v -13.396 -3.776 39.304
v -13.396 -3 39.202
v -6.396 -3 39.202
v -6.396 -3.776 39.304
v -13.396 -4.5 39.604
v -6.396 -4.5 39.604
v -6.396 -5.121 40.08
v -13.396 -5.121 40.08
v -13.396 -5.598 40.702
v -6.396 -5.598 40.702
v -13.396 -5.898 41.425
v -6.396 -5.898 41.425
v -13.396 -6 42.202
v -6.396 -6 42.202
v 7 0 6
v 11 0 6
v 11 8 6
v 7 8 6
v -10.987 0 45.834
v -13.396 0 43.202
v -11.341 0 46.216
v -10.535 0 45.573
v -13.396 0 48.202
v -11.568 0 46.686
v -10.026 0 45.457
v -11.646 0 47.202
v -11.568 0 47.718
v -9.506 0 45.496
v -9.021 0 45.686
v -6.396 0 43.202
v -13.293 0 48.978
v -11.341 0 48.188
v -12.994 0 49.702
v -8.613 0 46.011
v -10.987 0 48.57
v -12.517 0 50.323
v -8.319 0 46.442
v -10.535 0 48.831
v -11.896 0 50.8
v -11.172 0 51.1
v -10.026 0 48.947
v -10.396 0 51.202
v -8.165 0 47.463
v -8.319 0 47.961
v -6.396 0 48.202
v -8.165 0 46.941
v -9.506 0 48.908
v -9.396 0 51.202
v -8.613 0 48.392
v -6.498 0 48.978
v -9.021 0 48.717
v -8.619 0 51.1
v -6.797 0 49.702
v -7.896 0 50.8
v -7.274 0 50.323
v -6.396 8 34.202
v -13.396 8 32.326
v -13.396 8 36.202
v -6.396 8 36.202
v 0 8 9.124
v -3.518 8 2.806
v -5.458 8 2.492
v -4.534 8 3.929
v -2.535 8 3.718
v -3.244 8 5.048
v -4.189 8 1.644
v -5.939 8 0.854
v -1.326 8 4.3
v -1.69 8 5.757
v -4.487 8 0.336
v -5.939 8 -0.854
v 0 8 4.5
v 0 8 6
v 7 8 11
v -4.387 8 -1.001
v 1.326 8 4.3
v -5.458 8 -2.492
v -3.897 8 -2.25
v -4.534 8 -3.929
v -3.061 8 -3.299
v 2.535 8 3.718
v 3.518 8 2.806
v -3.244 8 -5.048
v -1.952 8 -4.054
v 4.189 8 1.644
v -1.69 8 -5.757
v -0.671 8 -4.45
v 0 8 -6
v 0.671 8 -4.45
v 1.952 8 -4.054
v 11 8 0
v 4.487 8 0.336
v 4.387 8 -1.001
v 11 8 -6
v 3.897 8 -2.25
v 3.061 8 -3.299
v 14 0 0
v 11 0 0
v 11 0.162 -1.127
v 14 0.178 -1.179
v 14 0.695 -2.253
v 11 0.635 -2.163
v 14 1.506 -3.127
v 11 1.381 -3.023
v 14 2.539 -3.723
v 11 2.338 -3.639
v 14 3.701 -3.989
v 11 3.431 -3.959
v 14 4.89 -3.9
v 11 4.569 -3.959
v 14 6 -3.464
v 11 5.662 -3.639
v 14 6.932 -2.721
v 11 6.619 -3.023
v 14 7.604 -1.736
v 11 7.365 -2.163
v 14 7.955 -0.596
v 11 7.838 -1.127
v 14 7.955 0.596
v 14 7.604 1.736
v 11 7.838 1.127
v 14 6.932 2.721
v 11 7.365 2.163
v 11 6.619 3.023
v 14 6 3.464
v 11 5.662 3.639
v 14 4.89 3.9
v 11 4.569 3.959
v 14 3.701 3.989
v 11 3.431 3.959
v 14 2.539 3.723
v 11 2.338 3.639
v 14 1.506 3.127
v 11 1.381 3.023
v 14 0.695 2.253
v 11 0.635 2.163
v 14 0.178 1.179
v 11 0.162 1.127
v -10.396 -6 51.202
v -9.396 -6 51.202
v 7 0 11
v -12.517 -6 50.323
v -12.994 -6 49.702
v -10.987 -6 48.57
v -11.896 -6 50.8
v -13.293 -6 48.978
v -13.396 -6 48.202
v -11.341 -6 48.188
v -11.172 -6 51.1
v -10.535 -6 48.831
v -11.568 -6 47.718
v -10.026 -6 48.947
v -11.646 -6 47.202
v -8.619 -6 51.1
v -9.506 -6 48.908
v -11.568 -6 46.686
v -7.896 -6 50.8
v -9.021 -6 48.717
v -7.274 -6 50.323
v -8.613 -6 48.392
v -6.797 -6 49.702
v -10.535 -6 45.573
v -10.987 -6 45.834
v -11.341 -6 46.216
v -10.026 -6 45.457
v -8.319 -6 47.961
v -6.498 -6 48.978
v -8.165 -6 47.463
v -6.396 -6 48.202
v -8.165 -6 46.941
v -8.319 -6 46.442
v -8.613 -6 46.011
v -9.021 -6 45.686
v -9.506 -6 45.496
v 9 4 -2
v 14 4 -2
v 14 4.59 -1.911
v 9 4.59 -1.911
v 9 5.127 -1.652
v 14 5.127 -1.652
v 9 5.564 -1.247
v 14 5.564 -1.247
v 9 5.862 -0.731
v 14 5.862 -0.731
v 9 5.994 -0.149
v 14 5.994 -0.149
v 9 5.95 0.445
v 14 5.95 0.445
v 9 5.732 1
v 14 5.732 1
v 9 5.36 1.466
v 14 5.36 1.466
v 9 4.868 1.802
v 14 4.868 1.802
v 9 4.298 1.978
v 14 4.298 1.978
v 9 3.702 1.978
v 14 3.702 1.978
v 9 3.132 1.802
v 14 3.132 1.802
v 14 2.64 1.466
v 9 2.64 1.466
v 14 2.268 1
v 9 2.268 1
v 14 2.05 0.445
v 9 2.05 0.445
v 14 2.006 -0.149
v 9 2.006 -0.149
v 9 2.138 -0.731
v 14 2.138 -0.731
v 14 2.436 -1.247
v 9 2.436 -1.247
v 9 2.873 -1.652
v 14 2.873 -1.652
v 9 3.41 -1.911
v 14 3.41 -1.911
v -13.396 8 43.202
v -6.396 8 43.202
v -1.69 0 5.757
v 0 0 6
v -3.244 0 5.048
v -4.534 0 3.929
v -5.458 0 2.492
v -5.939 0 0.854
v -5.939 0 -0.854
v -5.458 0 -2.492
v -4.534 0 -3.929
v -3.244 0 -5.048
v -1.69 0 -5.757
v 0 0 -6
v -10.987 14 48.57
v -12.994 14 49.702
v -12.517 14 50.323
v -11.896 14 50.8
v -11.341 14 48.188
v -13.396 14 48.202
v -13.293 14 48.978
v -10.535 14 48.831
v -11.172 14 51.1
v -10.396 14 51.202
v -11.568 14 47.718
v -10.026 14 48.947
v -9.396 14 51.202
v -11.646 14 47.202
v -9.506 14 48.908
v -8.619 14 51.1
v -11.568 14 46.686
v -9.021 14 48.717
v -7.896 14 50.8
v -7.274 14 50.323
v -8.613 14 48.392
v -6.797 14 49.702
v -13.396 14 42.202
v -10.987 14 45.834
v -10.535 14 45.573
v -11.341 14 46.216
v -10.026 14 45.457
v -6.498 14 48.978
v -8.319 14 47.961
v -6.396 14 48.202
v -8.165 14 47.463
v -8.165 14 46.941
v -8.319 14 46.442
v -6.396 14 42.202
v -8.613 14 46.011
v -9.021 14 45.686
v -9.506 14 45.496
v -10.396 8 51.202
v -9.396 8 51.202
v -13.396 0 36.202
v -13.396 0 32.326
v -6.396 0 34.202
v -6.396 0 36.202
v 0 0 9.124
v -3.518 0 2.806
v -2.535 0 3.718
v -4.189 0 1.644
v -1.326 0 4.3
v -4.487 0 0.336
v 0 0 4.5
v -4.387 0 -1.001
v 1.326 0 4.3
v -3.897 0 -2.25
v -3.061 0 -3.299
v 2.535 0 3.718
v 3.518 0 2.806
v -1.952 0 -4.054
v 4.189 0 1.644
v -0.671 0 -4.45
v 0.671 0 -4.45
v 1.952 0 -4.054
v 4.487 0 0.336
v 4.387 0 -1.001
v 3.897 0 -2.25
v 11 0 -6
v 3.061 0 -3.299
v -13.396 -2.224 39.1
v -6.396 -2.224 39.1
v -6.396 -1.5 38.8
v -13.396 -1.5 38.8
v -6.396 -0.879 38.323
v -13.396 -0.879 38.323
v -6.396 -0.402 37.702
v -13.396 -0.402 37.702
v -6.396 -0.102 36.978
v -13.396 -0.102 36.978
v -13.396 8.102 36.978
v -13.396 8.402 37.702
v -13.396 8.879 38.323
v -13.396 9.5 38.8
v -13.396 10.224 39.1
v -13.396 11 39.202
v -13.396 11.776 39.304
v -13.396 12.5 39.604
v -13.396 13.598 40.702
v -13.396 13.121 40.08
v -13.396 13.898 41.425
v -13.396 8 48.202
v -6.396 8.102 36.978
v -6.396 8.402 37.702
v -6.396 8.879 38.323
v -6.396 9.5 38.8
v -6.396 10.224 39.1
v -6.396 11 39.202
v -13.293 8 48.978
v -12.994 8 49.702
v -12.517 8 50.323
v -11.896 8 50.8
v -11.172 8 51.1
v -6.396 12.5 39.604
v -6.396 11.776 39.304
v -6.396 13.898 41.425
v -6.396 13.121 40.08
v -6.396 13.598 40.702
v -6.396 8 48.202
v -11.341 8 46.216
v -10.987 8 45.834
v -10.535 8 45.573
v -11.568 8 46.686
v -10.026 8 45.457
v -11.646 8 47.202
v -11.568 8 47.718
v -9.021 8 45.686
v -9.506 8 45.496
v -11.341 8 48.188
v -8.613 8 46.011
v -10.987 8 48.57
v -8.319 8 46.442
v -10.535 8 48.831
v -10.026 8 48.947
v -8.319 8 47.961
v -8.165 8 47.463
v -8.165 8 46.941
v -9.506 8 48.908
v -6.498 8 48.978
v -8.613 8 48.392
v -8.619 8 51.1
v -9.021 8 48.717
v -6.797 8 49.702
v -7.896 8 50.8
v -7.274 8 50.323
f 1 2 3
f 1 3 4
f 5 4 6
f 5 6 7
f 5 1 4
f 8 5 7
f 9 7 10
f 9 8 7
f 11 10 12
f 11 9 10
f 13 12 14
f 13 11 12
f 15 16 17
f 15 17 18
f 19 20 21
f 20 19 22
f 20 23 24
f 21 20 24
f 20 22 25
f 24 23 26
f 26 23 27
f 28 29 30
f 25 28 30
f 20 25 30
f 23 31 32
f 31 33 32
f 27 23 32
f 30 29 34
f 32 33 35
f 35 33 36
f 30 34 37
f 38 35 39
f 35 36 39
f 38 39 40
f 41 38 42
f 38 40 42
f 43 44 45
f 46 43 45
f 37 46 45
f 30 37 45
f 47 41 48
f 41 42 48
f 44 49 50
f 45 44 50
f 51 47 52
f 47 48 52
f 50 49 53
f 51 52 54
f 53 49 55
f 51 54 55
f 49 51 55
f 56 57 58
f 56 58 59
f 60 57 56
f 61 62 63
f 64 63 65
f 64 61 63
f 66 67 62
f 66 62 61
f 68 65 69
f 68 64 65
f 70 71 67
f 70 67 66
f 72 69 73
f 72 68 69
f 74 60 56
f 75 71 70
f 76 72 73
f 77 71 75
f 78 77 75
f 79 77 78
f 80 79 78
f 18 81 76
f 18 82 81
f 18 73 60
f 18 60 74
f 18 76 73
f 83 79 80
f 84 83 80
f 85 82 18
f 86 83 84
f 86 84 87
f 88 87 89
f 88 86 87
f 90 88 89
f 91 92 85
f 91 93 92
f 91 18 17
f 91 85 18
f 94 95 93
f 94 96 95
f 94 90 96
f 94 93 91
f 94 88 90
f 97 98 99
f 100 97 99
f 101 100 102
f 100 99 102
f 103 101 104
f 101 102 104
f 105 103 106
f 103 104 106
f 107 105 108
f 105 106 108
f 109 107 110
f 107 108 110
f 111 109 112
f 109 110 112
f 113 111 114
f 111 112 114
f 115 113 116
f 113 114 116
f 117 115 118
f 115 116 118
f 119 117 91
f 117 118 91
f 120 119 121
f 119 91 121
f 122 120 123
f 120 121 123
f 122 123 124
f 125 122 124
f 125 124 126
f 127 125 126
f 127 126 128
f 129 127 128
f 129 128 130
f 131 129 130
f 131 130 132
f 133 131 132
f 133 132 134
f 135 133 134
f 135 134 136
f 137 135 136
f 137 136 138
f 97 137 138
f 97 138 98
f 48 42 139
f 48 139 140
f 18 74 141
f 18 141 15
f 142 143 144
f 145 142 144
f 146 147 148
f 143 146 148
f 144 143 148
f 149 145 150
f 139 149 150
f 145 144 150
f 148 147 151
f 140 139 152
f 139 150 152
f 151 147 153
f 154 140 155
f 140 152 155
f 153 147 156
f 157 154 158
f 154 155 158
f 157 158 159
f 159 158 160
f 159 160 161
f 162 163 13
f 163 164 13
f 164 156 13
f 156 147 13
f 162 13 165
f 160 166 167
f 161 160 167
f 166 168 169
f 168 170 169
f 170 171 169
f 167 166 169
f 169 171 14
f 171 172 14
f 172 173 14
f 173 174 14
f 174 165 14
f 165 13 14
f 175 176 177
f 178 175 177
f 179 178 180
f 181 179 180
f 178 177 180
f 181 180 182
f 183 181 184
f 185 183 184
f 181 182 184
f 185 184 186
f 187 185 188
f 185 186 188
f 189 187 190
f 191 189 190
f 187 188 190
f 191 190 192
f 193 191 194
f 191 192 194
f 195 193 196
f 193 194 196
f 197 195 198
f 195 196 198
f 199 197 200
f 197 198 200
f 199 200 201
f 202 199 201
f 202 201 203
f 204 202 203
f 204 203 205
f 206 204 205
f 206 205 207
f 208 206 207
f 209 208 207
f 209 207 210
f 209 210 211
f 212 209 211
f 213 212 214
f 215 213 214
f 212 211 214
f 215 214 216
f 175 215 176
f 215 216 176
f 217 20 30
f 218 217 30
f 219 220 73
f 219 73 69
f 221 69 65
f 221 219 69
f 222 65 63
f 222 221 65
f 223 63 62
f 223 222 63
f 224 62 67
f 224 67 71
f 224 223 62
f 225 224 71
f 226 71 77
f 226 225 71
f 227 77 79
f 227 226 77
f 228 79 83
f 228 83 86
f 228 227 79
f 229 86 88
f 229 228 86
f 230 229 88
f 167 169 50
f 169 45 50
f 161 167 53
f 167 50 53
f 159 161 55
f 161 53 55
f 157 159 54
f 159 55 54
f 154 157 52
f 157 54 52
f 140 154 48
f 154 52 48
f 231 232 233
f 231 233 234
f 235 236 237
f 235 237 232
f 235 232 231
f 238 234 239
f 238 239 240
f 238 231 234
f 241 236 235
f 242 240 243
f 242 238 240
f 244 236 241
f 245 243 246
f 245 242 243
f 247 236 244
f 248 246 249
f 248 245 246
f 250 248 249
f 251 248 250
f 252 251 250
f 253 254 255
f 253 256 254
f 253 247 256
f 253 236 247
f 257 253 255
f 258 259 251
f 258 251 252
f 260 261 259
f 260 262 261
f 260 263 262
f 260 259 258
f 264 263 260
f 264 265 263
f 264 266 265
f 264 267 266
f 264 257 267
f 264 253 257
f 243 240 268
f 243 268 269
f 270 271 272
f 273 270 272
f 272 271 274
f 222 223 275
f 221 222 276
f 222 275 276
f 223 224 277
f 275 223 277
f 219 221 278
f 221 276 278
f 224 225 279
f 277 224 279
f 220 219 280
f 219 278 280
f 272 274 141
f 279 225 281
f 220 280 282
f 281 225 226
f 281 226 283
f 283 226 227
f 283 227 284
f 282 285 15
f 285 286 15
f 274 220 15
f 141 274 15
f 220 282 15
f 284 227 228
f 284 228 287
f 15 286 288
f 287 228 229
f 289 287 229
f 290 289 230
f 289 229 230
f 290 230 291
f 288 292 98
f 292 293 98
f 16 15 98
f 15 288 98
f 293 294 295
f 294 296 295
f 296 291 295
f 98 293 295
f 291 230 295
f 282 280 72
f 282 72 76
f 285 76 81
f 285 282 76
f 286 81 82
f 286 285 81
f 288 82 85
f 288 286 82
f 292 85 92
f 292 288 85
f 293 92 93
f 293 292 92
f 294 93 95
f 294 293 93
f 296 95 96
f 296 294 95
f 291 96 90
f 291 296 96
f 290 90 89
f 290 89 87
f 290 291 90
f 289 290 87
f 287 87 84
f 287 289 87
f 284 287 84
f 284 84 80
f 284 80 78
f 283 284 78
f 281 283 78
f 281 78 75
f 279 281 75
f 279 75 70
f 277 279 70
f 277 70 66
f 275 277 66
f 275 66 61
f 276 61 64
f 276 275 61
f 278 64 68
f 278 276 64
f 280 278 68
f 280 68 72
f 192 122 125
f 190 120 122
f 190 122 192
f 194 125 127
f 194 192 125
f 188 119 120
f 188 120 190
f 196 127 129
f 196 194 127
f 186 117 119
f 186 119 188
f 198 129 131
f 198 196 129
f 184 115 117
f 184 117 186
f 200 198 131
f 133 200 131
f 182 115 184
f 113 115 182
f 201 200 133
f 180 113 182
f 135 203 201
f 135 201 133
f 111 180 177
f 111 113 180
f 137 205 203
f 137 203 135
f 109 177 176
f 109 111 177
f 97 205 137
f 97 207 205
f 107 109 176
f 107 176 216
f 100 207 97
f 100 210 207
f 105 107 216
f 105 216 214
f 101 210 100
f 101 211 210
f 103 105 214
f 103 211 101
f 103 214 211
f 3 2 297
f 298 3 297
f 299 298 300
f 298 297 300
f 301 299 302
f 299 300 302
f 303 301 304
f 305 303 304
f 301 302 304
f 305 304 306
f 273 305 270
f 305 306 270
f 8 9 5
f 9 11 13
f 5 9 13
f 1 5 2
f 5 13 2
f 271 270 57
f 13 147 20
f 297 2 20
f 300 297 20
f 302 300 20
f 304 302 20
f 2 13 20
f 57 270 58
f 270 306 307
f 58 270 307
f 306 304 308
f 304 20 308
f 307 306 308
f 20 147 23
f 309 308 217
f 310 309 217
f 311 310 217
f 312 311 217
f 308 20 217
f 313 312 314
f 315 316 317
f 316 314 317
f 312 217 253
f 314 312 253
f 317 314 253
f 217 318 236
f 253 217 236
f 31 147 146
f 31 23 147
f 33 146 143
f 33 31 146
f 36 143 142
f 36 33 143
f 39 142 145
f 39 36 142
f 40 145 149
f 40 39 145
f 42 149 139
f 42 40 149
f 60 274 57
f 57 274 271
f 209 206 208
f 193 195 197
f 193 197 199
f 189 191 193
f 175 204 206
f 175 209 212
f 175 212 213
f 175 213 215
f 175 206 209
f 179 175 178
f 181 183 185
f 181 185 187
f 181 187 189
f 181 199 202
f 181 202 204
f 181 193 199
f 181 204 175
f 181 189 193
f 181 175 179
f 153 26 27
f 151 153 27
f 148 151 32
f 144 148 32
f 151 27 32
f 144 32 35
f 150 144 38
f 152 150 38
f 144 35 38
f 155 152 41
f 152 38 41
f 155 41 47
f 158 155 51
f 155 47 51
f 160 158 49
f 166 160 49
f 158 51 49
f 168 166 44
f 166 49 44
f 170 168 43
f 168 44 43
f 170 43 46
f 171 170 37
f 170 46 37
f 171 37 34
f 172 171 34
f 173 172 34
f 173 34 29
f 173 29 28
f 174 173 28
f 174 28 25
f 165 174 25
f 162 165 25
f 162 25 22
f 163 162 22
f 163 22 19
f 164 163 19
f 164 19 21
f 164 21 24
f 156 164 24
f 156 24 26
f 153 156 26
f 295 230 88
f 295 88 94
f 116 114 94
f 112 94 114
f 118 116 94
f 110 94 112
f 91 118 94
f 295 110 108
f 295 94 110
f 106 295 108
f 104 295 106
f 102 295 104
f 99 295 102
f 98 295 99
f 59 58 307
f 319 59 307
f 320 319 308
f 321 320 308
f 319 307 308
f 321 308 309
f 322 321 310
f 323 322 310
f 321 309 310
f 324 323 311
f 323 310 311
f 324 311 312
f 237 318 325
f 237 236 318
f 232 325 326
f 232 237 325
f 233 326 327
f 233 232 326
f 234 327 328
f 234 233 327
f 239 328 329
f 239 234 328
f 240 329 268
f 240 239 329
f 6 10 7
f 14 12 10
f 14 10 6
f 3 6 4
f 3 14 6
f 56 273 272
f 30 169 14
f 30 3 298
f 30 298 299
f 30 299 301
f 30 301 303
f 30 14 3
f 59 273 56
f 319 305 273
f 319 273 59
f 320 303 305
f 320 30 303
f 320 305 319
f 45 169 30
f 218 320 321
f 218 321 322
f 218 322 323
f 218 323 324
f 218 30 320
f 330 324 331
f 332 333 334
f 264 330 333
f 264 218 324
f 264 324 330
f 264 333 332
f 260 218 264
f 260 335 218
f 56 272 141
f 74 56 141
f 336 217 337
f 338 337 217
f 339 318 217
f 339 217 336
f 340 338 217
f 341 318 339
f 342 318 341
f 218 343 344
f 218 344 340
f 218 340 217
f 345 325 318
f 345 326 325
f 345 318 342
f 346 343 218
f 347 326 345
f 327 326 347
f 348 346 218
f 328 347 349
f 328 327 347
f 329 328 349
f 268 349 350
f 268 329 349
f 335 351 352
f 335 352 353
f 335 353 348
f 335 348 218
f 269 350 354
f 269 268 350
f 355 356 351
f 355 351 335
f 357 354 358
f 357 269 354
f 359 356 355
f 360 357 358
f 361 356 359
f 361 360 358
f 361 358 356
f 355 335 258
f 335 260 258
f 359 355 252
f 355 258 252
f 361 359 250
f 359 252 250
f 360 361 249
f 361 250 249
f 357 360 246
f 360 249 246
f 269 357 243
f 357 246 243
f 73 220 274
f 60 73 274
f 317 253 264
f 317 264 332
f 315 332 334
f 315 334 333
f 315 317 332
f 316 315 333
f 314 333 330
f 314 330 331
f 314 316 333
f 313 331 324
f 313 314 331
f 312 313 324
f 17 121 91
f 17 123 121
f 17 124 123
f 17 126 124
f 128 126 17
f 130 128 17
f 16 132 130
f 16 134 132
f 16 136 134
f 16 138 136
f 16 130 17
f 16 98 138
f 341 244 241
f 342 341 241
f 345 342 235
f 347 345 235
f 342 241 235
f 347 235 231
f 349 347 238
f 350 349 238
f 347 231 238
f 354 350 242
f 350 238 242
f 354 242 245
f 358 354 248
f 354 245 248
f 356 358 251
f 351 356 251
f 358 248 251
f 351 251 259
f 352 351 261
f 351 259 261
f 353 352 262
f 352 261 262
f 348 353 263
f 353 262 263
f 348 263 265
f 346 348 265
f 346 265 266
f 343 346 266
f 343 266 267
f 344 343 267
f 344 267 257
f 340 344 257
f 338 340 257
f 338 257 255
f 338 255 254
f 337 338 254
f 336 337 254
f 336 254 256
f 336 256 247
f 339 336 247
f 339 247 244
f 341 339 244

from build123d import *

# Parameters (mm, degrees)
SKETCH1_R           = 4.5
BOSS_EXTRUDE1_DEPTH = 8
SKETCH2_R           = 4
BOSS_EXTRUDE2_DEPTH = 3
SKETCH3_R           = 2
CUT_EXTRUDE1_DEPTH  = 5
BOSS_EXTRUDE3_DEPTH = 8
SKETCH5_W           = 7
SKETCH5_H           = 20
BOSS_EXTRUDE4_DEPTH = 12
FILLET1_START       = -13.395559342
FILLET1_DEPTH       = 7
FILLET1_2_DEPTH     = 7
SKETCH6_W           = 7
SKETCH6_H           = 8
CUT_EXTRUDE2_DEPTH  = 8
FILLET2_R           = 3
SKETCH7_R           = 1.75
CUT_EXTRUDE3_DEPTH  = 57.724097483


with BuildPart() as part:
    # Sketch1 → Boss-Extrude1 (new body)
    with BuildSketch(Plane(origin=(0, 0, 0), x_dir=(1, 0, 0), z_dir=(0, 1, 0))):
        with BuildLine():
            Line((0, 6), (11, 6))
            Line((11, 6), (11, -6))
            Line((11, -6), (0, -6))
            ThreePointArc((0, -6), (-6, 0), (0, 6))
        make_face()
        with Locations(Location((0, 0, 0), (0, 0, 270))):
            Circle(SKETCH1_R, mode=Mode.SUBTRACT)
    extrude(amount=BOSS_EXTRUDE1_DEPTH)

    # Sketch2 → Boss-Extrude2 (add)
    with BuildSketch(Plane(origin=(11, 0, 0), x_dir=(0, 0, -1), z_dir=(1, 0, 0))):
        with Locations(Location((0, 4, 0), (0, 0, 270))):
            Circle(SKETCH2_R)
    extrude(amount=BOSS_EXTRUDE2_DEPTH)

    # Sketch3 → Cut-Extrude1 (cut)
    with BuildSketch(Plane(origin=(14, 0, 0), x_dir=(0, 0, -1), z_dir=(1, 0, 0))):
        with Locations((0, 4)):
            Circle(SKETCH3_R)
    extrude(amount=-CUT_EXTRUDE1_DEPTH, mode=Mode.SUBTRACT)

    # Sketch4 → Boss-Extrude3 (add)
    with BuildSketch(Plane(origin=(0, 0, 0), x_dir=(1, 0, 0), z_dir=(0, 1, 0))):
        Polygon((0, -6), (0, -9.124355653), (-13.395559342, -32.326145029), (-13.395559342, -39.201789376), (-6.395559342, -39.201789376), (-6.395559342, -34.201789376), (7, -11), (7, -6), align=None)
    extrude(amount=BOSS_EXTRUDE3_DEPTH)

    # Sketch5 → Boss-Extrude4 (add)
    with BuildSketch(Plane.XY.offset(39.201789376)):
        with Locations((-9.895559342, 4)):
            Rectangle(SKETCH5_W, SKETCH5_H)
    extrude(amount=BOSS_EXTRUDE4_DEPTH)

    # Fillet1: read off the stored shape, not the designer's step
    # Fillet1 outline → Fillet1 (cut)
    with BuildSketch(Plane.YZ.offset(FILLET1_START)):
        with BuildLine():
            Line((-6, 39.201789376), (-3, 39.201789376))
            ThreePointArc((-3, 39.201789376), (-5.121320344, 40.080469032), (-6, 42.201789376))
            Line((-6, 42.201789376), (-6, 39.201789376))
        make_face()
        with BuildLine():
            ThreePointArc((14, 42.201789376), (13.121320344, 40.080469032), (11, 39.201789376))
            Line((11, 39.201789376), (14, 39.201789376))
            Line((14, 39.201789376), (14, 42.201789376))
        make_face()
    extrude(amount=FILLET1_DEPTH, mode=Mode.SUBTRACT)

    # Fillet1 2 outline → Fillet1 2 (add)
    with BuildSketch(Plane.YZ.offset(FILLET1_START)):
        with BuildLine():
            ThreePointArc((-3, 39.201789376), (-0.878679657, 38.32310972), (0, 36.201789376))
            Line((0, 36.201789376), (0, 39.201789376))
            Line((0, 39.201789376), (-3, 39.201789376))
        make_face()
        with BuildLine():
            ThreePointArc((8, 36.201789376), (8.878679656, 38.32310972), (11, 39.201789376))
            Line((11, 39.201789376), (8, 39.201789376))
            Line((8, 39.201789376), (8, 36.201789376))
        make_face()
    extrude(amount=FILLET1_2_DEPTH)

    # Sketch6 → Cut-Extrude2 (cut)
    with BuildSketch(Plane.XY.offset(51.201789376)):
        with Locations((-9.895559342, 4)):
            Rectangle(SKETCH6_W, SKETCH6_H)
    extrude(amount=-CUT_EXTRUDE2_DEPTH, mode=Mode.SUBTRACT)

    # Fillet2
    fillet2_edges = [part.edges().sort_by_distance(p)[0] for p in [
        (-6.395559342, -3, 51.201789376),
        (-13.395559342, 11, 51.201789376),
        (-6.395559342, 11, 51.201789376),
        (-13.395559342, -3, 51.201789376),
    ]]
    fillet(fillet2_edges, radius=FILLET2_R)

    # Sketch7 → Cut-Extrude3 (cut, through all)
    with BuildSketch(Plane(origin=(0, 14, 0), x_dir=(1, 0, 0), z_dir=(0, 1, 0))):
        with Locations(Location((-9.895559342, -47.201789376, 0), (0, 0, 180))):
            Circle(SKETCH7_R)
    extrude(amount=-CUT_EXTRUDE3_DEPTH, mode=Mode.SUBTRACT)


solid = part.part
